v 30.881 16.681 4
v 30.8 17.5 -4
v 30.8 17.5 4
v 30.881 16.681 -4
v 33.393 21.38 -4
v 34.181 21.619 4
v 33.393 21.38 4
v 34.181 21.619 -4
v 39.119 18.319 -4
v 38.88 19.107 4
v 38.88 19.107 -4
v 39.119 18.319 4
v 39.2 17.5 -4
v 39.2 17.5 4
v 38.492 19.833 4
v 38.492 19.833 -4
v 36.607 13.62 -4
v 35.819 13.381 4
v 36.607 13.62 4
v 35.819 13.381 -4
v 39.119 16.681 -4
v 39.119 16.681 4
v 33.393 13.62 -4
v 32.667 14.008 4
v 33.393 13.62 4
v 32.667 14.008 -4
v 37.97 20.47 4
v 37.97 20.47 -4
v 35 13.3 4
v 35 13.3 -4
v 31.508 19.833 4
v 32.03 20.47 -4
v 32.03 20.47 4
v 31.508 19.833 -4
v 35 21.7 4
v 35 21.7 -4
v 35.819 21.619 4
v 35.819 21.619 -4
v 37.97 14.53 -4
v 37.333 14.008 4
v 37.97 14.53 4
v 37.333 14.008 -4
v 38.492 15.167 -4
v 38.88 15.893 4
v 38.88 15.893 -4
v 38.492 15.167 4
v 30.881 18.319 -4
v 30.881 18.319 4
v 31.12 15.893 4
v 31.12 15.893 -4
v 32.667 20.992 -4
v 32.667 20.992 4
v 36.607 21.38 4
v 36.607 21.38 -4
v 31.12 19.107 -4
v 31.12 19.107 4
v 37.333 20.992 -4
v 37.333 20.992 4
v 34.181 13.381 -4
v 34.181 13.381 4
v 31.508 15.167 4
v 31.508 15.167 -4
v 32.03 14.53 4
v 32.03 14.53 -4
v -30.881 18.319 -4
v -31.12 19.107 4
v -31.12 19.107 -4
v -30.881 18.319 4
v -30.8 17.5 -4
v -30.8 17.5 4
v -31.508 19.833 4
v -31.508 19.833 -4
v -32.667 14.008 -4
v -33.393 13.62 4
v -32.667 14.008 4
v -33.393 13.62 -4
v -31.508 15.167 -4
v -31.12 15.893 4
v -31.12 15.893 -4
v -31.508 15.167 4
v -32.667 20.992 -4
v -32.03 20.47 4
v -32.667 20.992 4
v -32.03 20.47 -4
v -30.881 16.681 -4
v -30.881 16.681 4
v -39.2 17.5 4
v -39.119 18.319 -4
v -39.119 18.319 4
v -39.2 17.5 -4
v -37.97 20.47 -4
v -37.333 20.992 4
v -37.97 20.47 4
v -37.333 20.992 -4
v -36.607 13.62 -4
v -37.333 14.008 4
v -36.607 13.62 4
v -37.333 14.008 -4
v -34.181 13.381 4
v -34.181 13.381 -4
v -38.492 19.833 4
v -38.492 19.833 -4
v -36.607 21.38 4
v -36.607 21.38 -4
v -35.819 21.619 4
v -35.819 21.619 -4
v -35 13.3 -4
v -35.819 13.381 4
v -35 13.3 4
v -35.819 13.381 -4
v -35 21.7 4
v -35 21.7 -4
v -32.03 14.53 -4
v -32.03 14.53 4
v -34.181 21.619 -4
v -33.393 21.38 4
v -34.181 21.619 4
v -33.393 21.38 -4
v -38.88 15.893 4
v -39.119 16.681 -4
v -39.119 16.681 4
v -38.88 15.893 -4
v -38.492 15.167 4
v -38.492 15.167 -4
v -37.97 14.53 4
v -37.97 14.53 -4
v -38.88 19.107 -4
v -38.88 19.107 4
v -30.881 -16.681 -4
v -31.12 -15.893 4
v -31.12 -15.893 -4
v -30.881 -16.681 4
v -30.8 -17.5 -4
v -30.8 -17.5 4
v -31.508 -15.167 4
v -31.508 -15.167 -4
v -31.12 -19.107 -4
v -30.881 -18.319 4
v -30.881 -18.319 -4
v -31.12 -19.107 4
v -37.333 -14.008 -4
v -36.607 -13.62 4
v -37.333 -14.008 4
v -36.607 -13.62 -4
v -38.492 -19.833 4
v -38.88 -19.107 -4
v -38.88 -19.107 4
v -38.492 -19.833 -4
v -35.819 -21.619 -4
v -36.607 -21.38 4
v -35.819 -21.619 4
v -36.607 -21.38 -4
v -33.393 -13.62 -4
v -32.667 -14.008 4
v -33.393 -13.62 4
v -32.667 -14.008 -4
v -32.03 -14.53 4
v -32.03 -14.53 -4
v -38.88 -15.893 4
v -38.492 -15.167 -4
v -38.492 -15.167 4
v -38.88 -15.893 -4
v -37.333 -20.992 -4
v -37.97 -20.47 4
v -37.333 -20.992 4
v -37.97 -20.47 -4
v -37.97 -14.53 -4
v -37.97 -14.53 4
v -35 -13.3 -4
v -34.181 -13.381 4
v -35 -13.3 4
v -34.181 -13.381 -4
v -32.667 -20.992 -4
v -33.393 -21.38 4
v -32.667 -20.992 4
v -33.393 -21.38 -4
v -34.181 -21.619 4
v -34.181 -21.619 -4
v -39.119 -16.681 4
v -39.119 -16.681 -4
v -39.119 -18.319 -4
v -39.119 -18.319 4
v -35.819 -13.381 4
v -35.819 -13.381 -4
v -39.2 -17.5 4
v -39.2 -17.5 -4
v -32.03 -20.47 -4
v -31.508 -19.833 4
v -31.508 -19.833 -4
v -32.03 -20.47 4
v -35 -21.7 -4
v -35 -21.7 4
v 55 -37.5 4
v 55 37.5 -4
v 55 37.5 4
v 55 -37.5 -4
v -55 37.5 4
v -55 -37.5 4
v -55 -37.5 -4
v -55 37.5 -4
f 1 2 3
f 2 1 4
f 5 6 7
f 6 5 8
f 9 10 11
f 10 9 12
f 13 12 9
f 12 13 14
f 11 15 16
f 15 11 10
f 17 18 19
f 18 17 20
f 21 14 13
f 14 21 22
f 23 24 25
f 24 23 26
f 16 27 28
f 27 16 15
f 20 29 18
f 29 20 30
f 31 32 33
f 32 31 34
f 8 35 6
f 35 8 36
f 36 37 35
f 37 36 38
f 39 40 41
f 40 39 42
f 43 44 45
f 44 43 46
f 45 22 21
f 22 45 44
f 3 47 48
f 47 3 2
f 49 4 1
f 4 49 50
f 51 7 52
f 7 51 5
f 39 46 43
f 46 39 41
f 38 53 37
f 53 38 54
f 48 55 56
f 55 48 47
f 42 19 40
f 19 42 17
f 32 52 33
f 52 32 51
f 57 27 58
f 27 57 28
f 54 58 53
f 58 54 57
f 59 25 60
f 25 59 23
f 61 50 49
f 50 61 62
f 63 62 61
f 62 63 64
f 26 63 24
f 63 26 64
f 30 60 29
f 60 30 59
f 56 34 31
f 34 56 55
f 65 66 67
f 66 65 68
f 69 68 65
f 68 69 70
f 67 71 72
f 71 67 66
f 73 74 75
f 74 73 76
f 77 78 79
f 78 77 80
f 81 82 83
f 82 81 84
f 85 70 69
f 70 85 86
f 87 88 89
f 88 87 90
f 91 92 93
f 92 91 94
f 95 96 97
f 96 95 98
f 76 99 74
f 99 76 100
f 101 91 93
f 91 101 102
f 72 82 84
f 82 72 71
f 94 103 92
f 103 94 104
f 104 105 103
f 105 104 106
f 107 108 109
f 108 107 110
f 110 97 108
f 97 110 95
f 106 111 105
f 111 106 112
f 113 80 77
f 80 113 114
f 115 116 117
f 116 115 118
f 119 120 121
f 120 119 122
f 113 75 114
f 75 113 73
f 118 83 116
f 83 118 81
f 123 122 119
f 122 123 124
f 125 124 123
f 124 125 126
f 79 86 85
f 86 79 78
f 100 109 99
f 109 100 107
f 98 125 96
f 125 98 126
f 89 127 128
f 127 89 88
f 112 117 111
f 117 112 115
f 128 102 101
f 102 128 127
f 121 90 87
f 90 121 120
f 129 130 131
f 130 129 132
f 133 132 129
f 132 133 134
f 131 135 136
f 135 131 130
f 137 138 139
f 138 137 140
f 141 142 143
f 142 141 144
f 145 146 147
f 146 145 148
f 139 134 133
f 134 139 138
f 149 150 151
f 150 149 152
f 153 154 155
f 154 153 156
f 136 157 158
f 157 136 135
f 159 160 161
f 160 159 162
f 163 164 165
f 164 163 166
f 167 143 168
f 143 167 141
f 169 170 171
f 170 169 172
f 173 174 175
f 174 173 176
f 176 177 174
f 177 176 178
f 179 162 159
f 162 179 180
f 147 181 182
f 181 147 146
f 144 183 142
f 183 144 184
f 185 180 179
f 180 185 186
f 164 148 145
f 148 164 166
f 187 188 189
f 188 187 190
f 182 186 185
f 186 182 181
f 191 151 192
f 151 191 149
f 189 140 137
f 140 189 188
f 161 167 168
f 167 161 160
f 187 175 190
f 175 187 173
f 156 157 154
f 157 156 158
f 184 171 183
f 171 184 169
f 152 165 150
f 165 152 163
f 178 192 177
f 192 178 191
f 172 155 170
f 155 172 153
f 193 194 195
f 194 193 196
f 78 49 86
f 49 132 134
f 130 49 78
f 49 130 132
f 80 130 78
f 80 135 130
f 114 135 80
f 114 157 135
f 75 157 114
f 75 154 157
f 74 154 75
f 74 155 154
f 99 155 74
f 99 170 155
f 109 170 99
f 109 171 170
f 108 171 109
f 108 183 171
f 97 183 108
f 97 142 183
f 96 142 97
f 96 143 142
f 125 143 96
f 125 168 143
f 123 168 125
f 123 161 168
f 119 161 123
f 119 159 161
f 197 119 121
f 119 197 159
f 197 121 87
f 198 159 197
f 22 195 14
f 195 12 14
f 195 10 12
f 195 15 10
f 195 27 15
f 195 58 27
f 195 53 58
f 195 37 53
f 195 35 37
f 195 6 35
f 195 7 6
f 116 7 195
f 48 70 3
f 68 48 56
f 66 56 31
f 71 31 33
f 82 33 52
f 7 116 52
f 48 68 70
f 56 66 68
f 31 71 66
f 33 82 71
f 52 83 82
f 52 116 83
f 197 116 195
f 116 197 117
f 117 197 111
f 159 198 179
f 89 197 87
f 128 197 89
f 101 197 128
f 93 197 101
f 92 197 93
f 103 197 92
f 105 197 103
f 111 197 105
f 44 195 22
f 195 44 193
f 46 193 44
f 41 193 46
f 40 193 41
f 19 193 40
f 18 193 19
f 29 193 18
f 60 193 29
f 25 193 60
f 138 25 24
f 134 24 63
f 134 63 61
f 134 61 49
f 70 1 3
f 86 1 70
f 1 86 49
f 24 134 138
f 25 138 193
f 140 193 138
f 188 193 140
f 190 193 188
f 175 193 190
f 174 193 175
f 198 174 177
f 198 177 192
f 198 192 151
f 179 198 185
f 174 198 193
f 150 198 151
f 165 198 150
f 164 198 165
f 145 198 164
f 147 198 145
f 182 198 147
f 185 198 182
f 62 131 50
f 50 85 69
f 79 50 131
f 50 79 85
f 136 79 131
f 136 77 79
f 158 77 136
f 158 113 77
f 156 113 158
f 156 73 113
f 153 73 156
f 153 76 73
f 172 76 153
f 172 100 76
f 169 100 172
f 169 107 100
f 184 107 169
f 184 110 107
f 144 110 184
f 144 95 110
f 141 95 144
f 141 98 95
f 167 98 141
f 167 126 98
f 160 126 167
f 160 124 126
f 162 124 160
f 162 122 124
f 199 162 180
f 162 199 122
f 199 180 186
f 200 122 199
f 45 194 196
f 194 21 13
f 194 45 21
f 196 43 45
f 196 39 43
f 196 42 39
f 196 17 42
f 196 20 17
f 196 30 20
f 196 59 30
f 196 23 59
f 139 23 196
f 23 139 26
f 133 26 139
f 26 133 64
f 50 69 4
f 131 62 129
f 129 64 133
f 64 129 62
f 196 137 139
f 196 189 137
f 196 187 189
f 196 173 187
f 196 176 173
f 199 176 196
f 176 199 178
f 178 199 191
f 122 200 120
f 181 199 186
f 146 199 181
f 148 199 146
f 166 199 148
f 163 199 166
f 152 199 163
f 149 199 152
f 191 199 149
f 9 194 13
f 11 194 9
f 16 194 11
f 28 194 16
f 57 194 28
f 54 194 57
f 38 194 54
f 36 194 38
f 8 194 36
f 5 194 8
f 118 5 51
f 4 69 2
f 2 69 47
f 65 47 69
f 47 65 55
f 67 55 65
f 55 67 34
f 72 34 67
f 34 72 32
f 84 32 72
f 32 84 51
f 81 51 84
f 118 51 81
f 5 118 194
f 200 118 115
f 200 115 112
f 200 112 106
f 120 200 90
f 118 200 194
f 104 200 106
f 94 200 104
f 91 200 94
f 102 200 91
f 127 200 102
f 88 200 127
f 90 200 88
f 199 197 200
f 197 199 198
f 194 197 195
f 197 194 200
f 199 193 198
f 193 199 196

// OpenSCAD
$fn = 32;

// ----------------------------------------------------------------------
// Corner plate 110 x 75 x 8
// 3 holes, centres taken from the edge offset
// ----------------------------------------------------------------------

// --- parameters (mm) ---
plate = [110, 75, 8];  // overall size (x, y, z)
holes = 3;             // number of holes the drawing asks for
hole_d = 8.4;          // hole diameter
edge = 20;             // hole centre offset from the plate edge

// --- derived feature positions (mm) ---
corner_x = plate[0] / 2 - edge;  // = 35   corner hole X
corner_y = plate[1] / 2 - edge;  // = 17.5   corner hole Y
feature_centers = [
  [corner_x, corner_y],
  [-corner_x, corner_y],
  [-corner_x, -corner_y]
];   // hole centres the loop below drills

// plate outline, every hole drilled through with the same cutters
difference() {
  cube(plate, center = true);
  for (centre = feature_centers)
    translate([centre[0], centre[1], 0])
      cylinder(d = hole_d, h = plate[2] + 2, center = true);
}
